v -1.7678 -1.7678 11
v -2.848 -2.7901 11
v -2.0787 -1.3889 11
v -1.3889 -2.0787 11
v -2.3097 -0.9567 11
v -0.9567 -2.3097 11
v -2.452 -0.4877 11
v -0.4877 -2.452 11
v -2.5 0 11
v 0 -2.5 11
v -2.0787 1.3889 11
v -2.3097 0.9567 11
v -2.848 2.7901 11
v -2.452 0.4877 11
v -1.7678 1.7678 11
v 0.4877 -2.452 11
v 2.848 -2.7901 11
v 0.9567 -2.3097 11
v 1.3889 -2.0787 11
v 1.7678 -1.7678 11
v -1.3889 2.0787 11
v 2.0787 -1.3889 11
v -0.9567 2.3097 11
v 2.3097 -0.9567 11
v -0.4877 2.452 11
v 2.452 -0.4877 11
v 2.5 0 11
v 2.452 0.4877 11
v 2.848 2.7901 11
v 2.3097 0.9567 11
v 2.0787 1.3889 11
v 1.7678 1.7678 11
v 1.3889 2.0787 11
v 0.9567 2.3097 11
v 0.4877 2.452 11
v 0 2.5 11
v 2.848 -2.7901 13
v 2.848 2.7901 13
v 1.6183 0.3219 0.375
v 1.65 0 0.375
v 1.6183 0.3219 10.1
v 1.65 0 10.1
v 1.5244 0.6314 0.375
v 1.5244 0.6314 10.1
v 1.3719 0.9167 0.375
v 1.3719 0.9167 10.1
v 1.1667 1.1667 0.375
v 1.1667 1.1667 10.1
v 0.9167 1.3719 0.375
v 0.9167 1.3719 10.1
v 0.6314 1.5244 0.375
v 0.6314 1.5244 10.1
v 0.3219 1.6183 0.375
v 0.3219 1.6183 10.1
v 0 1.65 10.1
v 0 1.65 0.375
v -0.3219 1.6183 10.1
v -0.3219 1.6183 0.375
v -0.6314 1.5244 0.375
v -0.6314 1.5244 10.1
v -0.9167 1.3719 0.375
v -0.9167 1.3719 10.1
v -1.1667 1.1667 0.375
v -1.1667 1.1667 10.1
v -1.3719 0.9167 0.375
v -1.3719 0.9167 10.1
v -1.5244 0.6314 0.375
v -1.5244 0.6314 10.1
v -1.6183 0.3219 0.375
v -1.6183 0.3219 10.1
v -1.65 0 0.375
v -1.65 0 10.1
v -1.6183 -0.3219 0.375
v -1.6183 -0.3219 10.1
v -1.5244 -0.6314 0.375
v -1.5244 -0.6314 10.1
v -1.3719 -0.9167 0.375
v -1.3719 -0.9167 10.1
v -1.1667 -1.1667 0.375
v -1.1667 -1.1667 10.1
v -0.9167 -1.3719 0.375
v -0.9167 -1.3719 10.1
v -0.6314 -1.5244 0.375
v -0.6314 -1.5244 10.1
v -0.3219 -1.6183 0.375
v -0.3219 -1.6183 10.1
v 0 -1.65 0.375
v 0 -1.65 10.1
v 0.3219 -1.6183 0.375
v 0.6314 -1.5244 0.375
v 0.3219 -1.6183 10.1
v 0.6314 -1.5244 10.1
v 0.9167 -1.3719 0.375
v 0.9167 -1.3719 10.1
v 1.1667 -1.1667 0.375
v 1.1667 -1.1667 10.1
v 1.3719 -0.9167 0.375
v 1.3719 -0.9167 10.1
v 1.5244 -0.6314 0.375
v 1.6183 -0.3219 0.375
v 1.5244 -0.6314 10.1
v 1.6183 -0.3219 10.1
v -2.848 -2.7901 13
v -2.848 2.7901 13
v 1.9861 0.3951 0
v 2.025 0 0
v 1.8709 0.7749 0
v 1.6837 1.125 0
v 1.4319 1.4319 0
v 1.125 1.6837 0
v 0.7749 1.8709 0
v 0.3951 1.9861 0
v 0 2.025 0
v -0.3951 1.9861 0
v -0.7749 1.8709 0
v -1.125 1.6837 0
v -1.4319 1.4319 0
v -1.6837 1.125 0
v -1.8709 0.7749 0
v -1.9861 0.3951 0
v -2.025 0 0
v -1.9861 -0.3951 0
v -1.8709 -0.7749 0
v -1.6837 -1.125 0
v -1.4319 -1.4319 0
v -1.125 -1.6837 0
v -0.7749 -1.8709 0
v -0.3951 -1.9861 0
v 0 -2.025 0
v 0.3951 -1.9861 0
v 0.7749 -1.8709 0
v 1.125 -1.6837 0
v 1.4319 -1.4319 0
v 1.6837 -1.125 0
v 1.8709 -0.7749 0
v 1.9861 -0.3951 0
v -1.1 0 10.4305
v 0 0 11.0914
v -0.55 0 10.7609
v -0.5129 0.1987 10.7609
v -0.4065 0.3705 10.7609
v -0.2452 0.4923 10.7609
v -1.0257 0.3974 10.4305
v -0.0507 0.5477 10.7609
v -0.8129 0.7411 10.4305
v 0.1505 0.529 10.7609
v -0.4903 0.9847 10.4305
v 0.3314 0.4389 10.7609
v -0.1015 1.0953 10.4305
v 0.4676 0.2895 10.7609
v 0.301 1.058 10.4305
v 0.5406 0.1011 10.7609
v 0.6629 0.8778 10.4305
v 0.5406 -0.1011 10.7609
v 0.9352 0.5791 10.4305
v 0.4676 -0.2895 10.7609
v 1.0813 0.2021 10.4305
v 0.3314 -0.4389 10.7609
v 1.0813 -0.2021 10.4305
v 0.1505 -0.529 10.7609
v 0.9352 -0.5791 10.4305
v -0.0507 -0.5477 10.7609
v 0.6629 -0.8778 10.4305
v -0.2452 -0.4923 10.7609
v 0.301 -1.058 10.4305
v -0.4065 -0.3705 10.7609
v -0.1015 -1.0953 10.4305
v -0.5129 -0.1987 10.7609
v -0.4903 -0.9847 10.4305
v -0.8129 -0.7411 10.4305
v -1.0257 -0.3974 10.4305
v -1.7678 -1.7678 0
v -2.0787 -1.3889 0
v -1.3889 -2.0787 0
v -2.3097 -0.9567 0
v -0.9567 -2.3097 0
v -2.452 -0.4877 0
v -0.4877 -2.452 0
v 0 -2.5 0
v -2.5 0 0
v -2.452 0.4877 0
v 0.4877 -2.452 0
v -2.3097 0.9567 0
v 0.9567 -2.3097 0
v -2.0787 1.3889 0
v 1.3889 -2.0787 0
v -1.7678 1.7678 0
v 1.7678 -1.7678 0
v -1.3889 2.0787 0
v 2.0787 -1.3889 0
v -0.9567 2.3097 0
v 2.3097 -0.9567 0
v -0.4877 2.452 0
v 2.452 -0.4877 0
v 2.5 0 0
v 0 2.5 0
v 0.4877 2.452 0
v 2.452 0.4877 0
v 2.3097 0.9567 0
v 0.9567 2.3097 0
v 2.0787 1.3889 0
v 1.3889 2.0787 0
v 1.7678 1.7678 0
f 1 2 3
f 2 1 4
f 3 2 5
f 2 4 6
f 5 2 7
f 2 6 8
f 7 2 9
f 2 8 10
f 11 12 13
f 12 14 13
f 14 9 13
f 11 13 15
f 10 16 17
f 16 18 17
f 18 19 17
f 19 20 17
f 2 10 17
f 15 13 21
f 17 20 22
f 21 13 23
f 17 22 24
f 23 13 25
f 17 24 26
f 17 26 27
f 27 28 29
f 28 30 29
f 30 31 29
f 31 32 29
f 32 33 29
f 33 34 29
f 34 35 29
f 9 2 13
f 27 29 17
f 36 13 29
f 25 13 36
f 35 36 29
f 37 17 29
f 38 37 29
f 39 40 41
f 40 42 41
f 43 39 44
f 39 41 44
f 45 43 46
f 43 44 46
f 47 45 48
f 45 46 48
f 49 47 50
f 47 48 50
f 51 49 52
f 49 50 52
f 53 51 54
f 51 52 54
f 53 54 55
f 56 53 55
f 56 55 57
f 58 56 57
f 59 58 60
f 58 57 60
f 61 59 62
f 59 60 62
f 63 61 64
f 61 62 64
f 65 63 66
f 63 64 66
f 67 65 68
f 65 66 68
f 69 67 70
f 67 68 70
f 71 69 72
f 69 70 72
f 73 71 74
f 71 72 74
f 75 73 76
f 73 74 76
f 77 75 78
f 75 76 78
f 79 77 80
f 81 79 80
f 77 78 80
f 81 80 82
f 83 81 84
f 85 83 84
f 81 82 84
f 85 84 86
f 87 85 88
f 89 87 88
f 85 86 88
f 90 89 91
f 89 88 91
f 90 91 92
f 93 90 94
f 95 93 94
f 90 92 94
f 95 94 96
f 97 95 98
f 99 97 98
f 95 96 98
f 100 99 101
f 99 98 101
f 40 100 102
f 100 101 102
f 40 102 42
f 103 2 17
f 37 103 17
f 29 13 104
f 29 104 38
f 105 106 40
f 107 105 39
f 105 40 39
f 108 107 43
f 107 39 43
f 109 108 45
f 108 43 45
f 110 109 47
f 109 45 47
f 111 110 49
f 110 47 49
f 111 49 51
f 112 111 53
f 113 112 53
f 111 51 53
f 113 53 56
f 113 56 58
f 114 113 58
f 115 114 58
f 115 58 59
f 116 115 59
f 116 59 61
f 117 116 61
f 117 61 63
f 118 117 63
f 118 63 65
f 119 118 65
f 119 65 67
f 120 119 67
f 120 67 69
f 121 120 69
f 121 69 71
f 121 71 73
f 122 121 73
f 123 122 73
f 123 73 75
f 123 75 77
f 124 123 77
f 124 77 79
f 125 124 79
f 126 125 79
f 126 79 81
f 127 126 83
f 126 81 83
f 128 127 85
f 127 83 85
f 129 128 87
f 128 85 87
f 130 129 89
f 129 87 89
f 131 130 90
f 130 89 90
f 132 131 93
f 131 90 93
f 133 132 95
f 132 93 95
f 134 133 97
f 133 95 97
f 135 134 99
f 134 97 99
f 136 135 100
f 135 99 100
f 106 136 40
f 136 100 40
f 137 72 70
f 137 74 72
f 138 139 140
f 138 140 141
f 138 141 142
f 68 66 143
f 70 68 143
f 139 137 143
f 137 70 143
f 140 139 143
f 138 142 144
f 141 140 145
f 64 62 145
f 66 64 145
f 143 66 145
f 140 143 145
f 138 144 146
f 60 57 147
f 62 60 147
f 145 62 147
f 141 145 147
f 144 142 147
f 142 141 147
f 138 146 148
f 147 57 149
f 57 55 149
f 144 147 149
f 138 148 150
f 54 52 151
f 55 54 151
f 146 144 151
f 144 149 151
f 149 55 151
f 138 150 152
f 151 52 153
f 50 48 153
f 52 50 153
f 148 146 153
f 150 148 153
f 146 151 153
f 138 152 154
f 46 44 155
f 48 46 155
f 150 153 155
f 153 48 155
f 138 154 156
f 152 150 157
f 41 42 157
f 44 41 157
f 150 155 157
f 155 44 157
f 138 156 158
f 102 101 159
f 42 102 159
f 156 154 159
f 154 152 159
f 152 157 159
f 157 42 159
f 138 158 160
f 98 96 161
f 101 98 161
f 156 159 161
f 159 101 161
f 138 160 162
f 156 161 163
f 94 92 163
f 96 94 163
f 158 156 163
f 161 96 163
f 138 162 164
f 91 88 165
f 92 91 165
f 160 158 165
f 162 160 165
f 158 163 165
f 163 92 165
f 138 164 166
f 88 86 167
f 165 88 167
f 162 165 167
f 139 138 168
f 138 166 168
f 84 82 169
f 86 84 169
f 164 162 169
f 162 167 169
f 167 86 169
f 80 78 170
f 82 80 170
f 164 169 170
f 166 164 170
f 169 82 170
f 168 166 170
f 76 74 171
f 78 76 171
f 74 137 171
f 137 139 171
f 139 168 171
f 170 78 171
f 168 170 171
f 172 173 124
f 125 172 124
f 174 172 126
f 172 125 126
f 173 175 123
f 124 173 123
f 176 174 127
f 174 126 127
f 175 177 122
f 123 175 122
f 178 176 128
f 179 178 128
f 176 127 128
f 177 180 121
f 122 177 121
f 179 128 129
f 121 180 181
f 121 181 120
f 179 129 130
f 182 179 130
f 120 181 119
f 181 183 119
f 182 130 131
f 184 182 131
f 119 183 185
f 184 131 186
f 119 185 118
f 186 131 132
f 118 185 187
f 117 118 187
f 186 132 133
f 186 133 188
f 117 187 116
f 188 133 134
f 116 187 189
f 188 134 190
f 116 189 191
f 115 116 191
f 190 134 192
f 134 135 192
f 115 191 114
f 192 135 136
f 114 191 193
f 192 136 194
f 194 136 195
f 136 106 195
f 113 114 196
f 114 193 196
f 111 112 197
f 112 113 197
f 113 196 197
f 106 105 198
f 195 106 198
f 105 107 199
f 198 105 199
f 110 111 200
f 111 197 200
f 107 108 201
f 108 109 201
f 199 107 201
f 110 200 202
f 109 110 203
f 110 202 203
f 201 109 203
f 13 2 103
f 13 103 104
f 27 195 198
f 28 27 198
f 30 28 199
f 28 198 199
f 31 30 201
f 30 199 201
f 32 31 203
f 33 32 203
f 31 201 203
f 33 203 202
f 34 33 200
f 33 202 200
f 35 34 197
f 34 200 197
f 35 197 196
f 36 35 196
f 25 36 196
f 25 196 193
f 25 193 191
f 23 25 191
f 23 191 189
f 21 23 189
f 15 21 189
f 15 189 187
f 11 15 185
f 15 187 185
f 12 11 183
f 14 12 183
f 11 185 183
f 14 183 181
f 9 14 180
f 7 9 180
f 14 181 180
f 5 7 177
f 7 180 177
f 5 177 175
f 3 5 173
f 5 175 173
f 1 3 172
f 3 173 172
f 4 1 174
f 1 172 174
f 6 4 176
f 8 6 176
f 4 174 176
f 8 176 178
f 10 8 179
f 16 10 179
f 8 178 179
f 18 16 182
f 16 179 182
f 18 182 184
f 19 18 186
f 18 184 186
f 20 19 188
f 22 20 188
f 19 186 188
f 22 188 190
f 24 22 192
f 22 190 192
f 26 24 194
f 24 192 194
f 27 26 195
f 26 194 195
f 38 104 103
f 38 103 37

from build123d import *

# Parameters (mm, degrees)
SKETCH_1_R                   = 2.5
EXTRUDE_1_DEPTH              = 11
SKETCH_2_W                   = 5.696018396
SKETCH_2_H                   = 5.580245664
EXTRUDE_2_DEPTH              = 2
HOLE_WIZARD_M4_1_D           = 3.3
HOLE_WIZARD_M4_1_DEPTH       = 10.1
HOLE_WIZARD_M4_1_CSINK_D     = 4.05
HOLE_WIZARD_M4_1_CSINK_ANGLE = 90
HOLE_WIZARD_M4_1_TIP         = 0.991420021


with BuildPart() as part:
    # 스케치1 → 보스-돌출1 (new body)
    with BuildSketch(Plane.XY):
        Circle(SKETCH_1_R)
    extrude(amount=EXTRUDE_1_DEPTH)

    # 스케치2 → 보스-돌출2 (add)
    with BuildSketch(Plane.XY.offset(11)):
        Rectangle(SKETCH_2_W, SKETCH_2_H)
    extrude(amount=EXTRUDE_2_DEPTH)

    # M4 나사 구멍1
    with Locations(Plane(origin=(0, 0, 0), x_dir=(-1, 0, 0), z_dir=(0, 0, -1))):
        with Locations((0, 0)):
            CounterSinkHole(HOLE_WIZARD_M4_1_D / 2, HOLE_WIZARD_M4_1_CSINK_D / 2, depth=HOLE_WIZARD_M4_1_DEPTH, counter_sink_angle=HOLE_WIZARD_M4_1_CSINK_ANGLE)
            with Locations((0, 0, -(HOLE_WIZARD_M4_1_DEPTH + HOLE_WIZARD_M4_1_TIP / 2))):  # 118° drill point
                Cone(0, HOLE_WIZARD_M4_1_D / 2, HOLE_WIZARD_M4_1_TIP, mode=Mode.SUBTRACT)


solid = part.part
